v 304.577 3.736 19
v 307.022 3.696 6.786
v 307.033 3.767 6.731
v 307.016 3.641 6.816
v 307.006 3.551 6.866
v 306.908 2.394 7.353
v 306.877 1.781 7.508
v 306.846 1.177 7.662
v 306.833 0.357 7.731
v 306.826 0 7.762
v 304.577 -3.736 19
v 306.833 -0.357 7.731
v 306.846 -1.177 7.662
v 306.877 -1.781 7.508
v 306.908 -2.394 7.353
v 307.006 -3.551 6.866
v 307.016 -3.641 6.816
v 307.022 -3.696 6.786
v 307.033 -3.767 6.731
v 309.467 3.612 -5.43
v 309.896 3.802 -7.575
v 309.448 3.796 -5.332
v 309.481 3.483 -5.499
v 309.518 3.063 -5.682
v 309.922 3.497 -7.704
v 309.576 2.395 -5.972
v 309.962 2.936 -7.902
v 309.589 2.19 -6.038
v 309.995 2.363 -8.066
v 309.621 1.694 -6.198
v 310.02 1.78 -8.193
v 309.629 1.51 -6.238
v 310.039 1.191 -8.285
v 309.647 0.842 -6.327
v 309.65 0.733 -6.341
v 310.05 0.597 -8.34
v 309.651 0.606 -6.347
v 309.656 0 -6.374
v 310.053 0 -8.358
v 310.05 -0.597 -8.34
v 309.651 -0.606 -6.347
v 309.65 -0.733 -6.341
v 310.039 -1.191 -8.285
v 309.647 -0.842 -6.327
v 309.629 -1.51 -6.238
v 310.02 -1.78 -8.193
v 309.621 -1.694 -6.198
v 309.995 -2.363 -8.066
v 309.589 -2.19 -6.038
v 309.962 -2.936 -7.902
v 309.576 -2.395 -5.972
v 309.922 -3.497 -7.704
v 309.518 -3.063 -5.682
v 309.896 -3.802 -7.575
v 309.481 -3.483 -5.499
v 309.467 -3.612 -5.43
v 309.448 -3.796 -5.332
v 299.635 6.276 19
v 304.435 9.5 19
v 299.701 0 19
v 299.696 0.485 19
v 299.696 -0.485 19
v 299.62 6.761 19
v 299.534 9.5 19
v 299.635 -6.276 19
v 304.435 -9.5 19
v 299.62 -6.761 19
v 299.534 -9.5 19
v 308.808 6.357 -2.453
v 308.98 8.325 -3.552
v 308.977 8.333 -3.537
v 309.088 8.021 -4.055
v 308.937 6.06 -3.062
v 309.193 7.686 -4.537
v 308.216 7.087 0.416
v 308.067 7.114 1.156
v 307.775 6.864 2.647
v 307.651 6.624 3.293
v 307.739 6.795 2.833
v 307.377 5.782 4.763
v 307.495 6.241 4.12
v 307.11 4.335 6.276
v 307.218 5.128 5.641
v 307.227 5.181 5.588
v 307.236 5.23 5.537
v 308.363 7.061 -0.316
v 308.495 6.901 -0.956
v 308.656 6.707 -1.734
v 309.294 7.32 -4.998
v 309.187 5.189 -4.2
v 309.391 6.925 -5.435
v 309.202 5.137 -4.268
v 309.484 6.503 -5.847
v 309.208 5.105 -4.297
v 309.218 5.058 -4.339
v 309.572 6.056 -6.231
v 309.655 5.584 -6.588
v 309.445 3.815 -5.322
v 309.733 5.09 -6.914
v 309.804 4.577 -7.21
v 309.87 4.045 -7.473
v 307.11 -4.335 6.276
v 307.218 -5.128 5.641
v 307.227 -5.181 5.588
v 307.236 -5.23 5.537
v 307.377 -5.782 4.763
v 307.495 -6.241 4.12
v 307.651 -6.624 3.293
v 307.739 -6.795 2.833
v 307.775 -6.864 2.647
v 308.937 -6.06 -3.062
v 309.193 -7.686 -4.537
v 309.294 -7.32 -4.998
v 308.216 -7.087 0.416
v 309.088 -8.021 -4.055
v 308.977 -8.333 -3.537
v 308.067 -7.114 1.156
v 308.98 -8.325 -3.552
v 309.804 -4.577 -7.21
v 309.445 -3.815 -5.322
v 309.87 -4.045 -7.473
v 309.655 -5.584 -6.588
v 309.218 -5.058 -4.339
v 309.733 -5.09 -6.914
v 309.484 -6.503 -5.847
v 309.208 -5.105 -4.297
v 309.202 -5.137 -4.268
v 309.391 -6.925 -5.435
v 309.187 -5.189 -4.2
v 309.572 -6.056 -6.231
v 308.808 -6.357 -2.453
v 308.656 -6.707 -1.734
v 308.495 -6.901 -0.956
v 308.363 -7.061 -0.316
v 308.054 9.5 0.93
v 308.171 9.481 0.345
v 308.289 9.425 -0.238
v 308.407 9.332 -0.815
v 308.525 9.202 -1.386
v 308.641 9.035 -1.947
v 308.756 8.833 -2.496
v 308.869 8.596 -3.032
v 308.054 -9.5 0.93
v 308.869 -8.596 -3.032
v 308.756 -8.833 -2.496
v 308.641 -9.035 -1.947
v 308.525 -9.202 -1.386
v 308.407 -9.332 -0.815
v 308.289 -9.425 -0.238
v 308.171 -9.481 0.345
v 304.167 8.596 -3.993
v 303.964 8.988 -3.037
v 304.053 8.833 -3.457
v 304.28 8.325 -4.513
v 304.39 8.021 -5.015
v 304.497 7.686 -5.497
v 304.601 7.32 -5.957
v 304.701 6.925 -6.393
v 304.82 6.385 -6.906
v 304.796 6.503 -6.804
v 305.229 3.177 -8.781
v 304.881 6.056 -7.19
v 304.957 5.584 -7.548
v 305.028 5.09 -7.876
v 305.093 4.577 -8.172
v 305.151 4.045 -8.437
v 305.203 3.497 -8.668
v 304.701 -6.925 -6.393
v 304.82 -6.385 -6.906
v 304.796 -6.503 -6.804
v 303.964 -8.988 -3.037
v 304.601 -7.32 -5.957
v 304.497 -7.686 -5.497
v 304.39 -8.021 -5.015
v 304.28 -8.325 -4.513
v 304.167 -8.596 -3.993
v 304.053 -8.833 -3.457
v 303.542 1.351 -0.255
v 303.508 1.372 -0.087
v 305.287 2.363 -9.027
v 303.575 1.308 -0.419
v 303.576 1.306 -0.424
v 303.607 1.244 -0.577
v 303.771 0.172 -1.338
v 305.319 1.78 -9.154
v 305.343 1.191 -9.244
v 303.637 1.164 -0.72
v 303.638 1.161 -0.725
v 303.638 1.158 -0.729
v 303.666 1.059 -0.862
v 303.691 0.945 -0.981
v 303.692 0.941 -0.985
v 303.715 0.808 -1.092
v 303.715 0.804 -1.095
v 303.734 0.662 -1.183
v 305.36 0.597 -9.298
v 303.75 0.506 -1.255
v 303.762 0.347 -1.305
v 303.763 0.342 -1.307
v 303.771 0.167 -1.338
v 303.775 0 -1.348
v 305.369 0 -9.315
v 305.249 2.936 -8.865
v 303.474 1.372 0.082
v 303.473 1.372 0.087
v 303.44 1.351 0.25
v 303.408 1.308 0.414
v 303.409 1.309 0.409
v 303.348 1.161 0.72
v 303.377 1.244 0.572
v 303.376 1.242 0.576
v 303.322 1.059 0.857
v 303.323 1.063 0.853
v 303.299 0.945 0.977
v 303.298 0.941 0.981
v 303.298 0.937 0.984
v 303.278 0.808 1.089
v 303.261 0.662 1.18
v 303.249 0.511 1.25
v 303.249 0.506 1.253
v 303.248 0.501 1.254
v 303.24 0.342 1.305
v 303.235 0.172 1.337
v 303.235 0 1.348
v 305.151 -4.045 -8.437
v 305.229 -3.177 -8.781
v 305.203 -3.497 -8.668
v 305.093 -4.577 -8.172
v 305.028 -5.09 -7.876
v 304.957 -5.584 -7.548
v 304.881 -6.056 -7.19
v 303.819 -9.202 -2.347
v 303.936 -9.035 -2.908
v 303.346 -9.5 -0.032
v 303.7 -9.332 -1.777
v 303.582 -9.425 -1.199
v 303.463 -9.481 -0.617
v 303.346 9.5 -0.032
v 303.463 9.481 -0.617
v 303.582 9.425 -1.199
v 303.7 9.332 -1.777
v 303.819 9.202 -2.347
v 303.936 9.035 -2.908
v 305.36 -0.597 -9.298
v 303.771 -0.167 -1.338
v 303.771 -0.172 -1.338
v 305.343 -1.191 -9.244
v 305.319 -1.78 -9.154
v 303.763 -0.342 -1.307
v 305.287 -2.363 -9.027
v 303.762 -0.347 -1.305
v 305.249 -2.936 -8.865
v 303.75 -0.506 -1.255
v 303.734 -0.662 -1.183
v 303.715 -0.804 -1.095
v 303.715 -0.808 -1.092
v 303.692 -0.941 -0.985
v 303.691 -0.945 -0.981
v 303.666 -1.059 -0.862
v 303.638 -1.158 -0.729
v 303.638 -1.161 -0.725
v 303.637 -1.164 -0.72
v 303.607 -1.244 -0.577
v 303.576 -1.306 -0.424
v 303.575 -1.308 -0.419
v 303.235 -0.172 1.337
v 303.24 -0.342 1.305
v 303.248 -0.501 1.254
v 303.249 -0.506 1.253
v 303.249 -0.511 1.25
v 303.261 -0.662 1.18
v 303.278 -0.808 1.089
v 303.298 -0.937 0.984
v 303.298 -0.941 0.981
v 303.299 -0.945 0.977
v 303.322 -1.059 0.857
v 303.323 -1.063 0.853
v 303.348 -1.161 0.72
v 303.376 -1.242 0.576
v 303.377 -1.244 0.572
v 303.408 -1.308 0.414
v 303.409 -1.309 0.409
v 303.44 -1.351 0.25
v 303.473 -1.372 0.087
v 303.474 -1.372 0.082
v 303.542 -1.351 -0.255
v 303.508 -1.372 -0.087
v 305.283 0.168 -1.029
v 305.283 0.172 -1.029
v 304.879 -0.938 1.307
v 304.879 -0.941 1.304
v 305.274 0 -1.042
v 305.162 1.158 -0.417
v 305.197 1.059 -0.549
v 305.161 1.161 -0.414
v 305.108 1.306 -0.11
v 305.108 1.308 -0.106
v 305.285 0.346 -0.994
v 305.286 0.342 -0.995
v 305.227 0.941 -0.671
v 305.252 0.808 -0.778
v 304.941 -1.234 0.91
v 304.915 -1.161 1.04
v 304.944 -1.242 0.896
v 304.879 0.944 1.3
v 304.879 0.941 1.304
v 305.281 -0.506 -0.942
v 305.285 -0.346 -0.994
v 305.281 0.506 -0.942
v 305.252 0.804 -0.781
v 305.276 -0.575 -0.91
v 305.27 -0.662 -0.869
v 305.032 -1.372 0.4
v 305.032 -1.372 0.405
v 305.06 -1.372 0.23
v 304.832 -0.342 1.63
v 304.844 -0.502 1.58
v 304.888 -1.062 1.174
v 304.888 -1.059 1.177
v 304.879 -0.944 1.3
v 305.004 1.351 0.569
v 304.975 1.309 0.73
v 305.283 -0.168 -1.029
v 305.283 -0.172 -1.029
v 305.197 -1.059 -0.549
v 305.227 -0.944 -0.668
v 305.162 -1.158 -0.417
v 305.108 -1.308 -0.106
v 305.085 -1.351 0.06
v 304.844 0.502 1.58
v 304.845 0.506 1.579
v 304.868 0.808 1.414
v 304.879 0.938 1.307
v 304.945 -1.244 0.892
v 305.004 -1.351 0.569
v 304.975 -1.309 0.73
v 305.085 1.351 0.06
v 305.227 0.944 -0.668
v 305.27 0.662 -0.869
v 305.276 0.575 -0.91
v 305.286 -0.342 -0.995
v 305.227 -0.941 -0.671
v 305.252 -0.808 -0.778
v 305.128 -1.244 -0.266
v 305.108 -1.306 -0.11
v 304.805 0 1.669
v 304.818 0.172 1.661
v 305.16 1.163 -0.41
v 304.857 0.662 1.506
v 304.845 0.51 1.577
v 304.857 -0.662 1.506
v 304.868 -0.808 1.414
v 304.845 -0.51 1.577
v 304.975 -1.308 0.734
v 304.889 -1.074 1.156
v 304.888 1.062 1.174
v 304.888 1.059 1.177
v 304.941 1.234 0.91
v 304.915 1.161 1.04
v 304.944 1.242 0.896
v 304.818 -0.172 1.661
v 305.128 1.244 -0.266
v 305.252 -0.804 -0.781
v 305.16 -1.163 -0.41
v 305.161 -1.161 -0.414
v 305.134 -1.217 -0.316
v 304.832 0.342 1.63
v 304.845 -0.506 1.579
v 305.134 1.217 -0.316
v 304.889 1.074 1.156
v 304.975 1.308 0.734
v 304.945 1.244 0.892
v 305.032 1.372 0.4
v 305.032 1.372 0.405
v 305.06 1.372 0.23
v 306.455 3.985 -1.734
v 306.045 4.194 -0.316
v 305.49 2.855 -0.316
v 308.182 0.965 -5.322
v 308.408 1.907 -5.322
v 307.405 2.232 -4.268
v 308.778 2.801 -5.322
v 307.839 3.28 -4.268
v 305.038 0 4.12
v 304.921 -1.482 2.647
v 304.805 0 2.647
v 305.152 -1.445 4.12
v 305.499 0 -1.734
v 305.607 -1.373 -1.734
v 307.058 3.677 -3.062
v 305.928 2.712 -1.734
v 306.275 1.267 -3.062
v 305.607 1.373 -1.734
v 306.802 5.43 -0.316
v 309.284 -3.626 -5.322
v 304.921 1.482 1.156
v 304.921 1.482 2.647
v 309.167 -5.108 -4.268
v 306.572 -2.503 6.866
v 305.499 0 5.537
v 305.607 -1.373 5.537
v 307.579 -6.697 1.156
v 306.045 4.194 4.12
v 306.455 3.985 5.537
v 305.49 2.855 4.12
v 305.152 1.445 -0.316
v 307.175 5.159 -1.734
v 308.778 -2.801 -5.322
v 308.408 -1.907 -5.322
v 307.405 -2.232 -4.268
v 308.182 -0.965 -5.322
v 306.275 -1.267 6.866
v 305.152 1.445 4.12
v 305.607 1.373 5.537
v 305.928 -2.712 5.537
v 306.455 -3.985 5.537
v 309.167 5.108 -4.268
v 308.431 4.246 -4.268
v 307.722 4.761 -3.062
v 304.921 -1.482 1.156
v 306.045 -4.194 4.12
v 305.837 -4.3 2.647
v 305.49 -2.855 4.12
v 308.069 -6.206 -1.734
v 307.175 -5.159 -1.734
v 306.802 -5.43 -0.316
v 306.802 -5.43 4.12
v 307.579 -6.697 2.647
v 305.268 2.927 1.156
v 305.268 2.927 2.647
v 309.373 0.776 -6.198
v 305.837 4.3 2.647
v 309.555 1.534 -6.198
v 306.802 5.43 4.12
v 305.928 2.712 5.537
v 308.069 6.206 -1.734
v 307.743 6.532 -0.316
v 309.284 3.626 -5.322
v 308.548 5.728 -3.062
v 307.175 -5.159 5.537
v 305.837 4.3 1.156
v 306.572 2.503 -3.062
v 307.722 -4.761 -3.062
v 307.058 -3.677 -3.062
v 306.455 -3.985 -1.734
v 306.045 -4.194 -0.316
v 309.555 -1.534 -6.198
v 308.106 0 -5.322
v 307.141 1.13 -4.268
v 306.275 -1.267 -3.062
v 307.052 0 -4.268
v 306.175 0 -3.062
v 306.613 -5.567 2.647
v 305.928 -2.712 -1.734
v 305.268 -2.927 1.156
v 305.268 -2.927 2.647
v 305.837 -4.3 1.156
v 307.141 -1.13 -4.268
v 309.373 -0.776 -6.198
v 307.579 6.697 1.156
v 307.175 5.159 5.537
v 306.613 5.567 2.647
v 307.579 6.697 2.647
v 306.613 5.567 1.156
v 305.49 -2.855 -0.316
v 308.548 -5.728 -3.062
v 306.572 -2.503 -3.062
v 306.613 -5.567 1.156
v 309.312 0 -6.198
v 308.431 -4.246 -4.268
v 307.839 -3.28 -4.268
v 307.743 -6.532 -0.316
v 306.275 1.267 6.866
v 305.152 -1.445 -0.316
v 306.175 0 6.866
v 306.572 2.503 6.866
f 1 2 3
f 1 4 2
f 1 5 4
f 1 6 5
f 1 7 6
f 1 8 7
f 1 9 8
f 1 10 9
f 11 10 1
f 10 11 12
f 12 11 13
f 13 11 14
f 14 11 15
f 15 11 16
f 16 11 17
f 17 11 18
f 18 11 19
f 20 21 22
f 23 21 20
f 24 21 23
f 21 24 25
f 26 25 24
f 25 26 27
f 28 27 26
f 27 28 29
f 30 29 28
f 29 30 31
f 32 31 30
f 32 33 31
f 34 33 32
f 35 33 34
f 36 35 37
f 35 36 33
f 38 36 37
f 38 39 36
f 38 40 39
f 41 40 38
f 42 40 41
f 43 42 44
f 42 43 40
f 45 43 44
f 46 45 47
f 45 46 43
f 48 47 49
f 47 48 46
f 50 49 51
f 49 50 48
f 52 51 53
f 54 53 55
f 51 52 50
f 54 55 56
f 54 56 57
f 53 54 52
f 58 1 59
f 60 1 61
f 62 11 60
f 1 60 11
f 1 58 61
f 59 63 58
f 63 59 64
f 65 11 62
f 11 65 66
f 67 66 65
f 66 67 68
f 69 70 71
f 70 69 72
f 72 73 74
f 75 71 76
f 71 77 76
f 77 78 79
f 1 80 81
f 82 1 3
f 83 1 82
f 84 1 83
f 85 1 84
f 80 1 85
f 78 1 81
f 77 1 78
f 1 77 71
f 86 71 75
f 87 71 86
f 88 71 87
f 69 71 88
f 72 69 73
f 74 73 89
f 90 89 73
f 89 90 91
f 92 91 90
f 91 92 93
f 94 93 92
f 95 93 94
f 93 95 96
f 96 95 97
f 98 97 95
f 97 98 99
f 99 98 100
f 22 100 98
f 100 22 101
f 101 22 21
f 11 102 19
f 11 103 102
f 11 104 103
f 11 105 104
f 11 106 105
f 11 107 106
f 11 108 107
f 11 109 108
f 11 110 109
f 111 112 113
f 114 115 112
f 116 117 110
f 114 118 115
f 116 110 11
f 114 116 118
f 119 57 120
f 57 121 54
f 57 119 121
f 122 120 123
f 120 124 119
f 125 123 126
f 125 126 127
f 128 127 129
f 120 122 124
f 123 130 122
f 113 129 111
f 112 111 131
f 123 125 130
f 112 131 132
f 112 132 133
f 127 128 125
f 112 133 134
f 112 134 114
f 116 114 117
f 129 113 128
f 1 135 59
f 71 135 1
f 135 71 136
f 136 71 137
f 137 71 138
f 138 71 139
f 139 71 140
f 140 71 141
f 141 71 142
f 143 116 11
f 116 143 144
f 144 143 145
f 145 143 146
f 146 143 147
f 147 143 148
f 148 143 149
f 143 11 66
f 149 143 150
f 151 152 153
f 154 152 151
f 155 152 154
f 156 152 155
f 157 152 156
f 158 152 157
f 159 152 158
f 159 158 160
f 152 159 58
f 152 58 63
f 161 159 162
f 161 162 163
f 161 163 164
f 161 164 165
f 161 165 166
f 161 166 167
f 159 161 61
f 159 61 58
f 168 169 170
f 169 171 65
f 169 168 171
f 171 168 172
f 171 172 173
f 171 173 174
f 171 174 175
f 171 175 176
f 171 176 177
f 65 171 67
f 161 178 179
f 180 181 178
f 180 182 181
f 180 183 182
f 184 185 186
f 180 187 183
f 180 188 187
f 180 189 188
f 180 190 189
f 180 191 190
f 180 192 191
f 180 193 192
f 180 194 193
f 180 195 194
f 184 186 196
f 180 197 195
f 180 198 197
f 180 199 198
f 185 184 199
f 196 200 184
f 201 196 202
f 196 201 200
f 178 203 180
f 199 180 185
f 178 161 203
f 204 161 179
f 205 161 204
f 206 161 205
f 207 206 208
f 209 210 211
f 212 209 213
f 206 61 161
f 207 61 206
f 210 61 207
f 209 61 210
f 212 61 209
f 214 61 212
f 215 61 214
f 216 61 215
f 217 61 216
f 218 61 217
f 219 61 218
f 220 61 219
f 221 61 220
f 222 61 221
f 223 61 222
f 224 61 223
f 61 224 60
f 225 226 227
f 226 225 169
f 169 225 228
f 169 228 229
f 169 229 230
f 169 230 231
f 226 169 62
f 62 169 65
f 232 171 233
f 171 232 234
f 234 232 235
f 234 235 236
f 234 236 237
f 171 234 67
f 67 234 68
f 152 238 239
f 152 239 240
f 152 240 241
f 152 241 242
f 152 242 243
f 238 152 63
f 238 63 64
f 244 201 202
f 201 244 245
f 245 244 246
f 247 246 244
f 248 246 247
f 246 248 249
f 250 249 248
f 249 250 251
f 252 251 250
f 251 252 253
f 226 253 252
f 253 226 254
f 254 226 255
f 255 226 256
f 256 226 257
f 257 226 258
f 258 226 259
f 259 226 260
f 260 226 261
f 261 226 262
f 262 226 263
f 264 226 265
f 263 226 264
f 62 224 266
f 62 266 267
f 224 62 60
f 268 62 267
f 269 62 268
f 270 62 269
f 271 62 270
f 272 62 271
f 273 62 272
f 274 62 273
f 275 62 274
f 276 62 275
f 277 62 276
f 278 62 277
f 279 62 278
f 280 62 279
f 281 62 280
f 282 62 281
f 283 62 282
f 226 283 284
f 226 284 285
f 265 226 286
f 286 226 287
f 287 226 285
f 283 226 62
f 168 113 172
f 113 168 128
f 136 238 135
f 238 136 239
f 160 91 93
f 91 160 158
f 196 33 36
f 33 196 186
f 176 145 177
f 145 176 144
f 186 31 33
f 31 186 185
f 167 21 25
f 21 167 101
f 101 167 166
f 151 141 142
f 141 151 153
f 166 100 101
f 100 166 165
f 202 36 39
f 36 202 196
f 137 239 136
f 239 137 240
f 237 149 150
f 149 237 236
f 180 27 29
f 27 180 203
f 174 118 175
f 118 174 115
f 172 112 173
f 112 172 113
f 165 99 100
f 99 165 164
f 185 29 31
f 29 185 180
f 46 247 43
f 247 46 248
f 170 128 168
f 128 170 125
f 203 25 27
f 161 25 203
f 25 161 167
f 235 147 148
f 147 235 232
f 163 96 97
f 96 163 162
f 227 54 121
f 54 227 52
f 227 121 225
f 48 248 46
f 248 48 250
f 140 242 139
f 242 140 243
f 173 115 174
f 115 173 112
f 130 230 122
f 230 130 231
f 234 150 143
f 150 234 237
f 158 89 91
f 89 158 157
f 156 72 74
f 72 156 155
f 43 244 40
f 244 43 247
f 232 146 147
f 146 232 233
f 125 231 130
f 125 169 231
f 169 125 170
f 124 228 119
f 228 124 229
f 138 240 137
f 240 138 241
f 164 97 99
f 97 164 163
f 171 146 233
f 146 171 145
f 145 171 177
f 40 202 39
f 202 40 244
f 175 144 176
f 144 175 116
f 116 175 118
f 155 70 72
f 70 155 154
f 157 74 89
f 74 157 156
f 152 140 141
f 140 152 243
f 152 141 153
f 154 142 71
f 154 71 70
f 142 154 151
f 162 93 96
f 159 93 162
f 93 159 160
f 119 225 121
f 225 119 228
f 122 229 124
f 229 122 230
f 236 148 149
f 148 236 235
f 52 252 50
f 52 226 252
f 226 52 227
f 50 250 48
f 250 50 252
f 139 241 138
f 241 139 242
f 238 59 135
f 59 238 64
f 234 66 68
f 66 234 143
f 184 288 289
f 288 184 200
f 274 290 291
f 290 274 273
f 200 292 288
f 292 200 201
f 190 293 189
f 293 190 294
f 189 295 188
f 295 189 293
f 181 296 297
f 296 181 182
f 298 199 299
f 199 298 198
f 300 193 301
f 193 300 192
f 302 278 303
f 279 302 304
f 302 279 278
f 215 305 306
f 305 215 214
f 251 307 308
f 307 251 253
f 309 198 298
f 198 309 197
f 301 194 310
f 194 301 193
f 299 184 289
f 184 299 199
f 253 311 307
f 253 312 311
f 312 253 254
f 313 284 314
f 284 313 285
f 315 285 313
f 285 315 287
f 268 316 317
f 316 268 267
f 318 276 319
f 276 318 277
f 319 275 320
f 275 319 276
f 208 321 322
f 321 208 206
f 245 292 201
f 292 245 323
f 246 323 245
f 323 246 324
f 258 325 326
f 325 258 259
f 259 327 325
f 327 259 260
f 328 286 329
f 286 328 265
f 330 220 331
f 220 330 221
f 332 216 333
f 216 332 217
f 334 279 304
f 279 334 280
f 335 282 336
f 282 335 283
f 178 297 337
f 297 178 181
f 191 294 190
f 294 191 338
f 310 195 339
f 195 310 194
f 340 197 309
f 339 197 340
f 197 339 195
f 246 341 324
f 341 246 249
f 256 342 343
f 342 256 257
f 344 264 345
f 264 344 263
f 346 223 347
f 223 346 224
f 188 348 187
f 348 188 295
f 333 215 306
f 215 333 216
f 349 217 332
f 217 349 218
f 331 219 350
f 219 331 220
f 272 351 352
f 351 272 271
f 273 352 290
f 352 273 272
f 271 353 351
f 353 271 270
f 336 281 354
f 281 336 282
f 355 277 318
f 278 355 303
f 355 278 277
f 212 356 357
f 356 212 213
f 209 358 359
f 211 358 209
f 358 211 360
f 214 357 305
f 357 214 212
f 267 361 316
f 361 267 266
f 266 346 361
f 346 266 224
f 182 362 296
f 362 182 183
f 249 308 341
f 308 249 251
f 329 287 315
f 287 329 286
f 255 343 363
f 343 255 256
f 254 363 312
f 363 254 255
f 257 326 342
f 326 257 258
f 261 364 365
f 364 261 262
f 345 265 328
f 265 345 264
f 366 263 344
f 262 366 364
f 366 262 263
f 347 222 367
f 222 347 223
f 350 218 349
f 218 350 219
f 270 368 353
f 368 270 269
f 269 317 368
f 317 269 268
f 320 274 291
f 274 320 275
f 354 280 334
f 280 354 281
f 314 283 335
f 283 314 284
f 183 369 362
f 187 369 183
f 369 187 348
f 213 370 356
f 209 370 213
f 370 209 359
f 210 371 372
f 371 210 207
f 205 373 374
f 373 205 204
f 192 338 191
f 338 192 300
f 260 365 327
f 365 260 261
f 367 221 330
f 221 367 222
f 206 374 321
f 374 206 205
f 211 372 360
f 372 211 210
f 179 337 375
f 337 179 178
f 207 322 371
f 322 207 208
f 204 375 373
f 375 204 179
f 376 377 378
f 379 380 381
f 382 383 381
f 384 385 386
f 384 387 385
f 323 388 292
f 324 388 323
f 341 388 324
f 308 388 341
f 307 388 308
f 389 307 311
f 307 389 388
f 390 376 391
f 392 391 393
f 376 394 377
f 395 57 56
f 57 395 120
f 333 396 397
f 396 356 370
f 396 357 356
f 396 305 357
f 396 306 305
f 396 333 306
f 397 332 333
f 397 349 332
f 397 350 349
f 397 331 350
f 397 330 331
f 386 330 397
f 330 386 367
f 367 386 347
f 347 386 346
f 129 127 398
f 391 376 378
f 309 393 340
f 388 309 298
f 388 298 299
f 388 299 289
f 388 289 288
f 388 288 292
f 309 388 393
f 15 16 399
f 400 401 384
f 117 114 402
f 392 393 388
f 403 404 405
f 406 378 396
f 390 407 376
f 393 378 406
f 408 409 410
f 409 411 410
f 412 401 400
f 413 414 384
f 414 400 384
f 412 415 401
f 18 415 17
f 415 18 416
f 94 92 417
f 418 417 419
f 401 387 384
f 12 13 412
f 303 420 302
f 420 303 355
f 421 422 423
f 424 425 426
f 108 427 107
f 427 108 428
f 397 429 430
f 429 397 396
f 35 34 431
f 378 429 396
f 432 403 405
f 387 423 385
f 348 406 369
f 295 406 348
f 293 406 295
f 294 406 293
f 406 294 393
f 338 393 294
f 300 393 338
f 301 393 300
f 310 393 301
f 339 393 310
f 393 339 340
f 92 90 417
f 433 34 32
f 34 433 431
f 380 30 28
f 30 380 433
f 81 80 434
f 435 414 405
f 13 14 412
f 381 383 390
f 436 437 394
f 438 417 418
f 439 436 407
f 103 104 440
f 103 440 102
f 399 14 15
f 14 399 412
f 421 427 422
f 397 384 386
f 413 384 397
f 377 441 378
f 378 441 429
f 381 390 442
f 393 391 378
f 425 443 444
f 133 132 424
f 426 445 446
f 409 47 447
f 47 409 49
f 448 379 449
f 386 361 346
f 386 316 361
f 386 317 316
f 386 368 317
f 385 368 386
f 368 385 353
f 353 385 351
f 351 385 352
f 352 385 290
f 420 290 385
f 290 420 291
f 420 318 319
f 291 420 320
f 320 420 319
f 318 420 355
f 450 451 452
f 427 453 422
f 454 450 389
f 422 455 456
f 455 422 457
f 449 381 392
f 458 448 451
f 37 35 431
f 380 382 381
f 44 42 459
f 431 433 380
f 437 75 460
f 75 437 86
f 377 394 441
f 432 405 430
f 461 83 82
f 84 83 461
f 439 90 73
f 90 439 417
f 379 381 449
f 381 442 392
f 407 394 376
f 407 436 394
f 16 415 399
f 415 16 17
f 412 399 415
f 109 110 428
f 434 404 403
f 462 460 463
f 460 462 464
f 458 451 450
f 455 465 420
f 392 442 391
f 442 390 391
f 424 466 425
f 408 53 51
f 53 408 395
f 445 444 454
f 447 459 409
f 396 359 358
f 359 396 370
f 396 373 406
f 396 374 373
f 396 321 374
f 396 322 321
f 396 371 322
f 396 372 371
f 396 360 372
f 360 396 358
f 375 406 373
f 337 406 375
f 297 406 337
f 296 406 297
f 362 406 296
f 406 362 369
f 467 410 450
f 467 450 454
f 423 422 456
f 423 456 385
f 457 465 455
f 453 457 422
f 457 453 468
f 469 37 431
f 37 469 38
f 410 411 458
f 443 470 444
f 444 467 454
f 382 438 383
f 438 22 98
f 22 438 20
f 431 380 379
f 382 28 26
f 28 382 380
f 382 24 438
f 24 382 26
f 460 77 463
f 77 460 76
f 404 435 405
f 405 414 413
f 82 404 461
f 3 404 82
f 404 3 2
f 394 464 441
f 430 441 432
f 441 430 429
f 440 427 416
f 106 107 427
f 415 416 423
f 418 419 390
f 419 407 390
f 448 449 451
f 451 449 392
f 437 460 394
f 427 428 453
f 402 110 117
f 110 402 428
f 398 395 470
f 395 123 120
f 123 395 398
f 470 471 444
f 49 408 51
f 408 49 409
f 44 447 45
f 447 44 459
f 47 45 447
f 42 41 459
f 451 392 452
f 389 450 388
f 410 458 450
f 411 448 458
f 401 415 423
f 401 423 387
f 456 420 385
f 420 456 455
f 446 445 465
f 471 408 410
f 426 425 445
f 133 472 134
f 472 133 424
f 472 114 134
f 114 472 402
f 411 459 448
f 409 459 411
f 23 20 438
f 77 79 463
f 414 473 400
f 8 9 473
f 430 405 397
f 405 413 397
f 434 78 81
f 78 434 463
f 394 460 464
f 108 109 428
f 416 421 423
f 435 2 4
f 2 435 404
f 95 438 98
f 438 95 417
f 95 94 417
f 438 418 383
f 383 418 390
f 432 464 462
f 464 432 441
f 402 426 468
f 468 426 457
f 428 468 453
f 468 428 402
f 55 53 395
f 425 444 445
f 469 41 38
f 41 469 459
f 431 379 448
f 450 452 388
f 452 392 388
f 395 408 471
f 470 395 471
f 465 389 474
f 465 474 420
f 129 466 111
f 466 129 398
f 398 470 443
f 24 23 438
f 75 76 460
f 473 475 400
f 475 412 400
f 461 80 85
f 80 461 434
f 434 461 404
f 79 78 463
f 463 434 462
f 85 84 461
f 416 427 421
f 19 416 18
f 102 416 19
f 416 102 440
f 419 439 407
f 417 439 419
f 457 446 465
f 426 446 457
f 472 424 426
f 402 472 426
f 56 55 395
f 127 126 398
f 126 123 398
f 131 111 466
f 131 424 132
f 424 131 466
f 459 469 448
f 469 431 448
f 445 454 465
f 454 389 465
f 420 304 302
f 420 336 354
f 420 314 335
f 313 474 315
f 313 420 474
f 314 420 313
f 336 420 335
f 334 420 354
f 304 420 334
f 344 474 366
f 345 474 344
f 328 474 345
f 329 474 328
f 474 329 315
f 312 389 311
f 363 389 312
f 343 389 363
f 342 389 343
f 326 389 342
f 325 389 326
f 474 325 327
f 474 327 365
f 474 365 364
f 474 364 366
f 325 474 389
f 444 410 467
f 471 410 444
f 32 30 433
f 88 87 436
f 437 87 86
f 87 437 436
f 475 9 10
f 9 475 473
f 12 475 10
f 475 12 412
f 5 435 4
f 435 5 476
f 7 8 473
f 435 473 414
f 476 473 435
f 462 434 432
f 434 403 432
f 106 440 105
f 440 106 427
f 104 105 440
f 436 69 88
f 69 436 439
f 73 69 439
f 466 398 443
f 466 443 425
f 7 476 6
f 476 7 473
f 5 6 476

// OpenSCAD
// Guide #2, for the top row of tacks relative to the bottom row
//
// This minimalistic guide places the centre (and thus shaft position) for the second
// row tacks by being pressed up against the edges of the first row tacks they should
// be touching.

module cone(inclination, sweep, slice = [0, 200])
{
  rotate_extrude(angle = sweep)
  polygon(
    [
      [0, slice[0]],
      [slice[0] * sin(inclination), slice[0]],
      [slice[1] * sin(inclination), slice[1]],
      [0, slice[1]]
    ]);
}

inclination_x = 42.5;
inclination_y = 208;

inclination = atan2(inclination_x, inclination_y);

echo(str("Inclination: ", inclination_y, "x", inclination_x, " is ", inclination, " degrees"));

first_row_circumference_mm = 1990;
first_row_diameter_mm = first_row_circumference_mm / PI;
first_row_radius_mm = first_row_diameter_mm / 2;
//inclination = 15;
tack_diameter_mm = 19;
tack_count = 72;
guide_thickness_mm = 5;
tack_shaft_diameter_mm = 2.75;

first_row_tack_spacing_mm = first_row_circumference_mm / tack_count;
second_row_uninclined_offset_y_mm = sqrt(pow(tack_diameter_mm * 2, 2) - pow(first_row_tack_spacing_mm * 0.5, 2));
second_row_offset_y_mm = second_row_uninclined_offset_y_mm * cos(inclination);

second_row_radius_mm = first_row_radius_mm - second_row_offset_y_mm * sin(inclination);
second_row_diameter_mm = second_row_radius_mm * 2;
second_row_circumference_mm = second_row_diameter_mm * PI;

tack_sweep = 360 * tack_diameter_mm / second_row_circumference_mm;
radius_top_mm = second_row_radius_mm - tack_diameter_mm * sin(inclination);
radius_bottom_mm = second_row_radius_mm + tack_diameter_mm * sin(inclination);
cutaway_vertical_displacement_mm = guide_thickness_mm / tan(inclination);
slice_start = (radius_bottom_mm + guide_thickness_mm) / sin(inclination);
slice_end = (radius_top_mm + guide_thickness_mm) / sin(inclination);
tack_y_mm = second_row_radius_mm / tan(inclination) + cutaway_vertical_displacement_mm;
tack_shaft_radius_mm = tack_shaft_diameter_mm * 0.5;

difference()
{
  intersection()
  {
    scale([1, 1, -1])
    translate([0, 0, -tack_y_mm])
    difference()
    {
      rotate([0, 0, -tack_sweep])
      cone(inclination, 2 * tack_sweep, [tack_y_mm - tack_diameter_mm, tack_y_mm + tack_diameter_mm], $fn = 300);
      translate([0, 0, cutaway_vertical_displacement_mm])
      cone(inclination, 360, [tack_y_mm - tack_diameter_mm - cutaway_vertical_displacement_mm - 5, tack_y_mm + tack_diameter_mm], $fn = 300);
    }

    translate([0, 0, -second_row_radius_mm * sin(inclination)])
    rotate([0, 90 - inclination, 0])
    union()
    {
      cylinder(second_row_radius_mm + 10, d = tack_diameter_mm, $fn = 100);
      translate([-tack_diameter_mm, 0, second_row_radius_mm])
      cube([tack_diameter_mm * 2, tack_diameter_mm, guide_thickness_mm + 10], center = true);
    }
  }

  translate([0, 0, -second_row_radius_mm * sin(inclination)])
  rotate([0, 90 - inclination, 0])
  cylinder(second_row_radius_mm + 10, d = tack_shaft_diameter_mm, $fn = 50);

  translate([second_row_radius_mm + tack_diameter_mm * 0.5 - guide_thickness_mm, 0, tack_diameter_mm * sin(inclination) / 2])
  sphere(d = tack_diameter_mm, $fn = 40);
}
